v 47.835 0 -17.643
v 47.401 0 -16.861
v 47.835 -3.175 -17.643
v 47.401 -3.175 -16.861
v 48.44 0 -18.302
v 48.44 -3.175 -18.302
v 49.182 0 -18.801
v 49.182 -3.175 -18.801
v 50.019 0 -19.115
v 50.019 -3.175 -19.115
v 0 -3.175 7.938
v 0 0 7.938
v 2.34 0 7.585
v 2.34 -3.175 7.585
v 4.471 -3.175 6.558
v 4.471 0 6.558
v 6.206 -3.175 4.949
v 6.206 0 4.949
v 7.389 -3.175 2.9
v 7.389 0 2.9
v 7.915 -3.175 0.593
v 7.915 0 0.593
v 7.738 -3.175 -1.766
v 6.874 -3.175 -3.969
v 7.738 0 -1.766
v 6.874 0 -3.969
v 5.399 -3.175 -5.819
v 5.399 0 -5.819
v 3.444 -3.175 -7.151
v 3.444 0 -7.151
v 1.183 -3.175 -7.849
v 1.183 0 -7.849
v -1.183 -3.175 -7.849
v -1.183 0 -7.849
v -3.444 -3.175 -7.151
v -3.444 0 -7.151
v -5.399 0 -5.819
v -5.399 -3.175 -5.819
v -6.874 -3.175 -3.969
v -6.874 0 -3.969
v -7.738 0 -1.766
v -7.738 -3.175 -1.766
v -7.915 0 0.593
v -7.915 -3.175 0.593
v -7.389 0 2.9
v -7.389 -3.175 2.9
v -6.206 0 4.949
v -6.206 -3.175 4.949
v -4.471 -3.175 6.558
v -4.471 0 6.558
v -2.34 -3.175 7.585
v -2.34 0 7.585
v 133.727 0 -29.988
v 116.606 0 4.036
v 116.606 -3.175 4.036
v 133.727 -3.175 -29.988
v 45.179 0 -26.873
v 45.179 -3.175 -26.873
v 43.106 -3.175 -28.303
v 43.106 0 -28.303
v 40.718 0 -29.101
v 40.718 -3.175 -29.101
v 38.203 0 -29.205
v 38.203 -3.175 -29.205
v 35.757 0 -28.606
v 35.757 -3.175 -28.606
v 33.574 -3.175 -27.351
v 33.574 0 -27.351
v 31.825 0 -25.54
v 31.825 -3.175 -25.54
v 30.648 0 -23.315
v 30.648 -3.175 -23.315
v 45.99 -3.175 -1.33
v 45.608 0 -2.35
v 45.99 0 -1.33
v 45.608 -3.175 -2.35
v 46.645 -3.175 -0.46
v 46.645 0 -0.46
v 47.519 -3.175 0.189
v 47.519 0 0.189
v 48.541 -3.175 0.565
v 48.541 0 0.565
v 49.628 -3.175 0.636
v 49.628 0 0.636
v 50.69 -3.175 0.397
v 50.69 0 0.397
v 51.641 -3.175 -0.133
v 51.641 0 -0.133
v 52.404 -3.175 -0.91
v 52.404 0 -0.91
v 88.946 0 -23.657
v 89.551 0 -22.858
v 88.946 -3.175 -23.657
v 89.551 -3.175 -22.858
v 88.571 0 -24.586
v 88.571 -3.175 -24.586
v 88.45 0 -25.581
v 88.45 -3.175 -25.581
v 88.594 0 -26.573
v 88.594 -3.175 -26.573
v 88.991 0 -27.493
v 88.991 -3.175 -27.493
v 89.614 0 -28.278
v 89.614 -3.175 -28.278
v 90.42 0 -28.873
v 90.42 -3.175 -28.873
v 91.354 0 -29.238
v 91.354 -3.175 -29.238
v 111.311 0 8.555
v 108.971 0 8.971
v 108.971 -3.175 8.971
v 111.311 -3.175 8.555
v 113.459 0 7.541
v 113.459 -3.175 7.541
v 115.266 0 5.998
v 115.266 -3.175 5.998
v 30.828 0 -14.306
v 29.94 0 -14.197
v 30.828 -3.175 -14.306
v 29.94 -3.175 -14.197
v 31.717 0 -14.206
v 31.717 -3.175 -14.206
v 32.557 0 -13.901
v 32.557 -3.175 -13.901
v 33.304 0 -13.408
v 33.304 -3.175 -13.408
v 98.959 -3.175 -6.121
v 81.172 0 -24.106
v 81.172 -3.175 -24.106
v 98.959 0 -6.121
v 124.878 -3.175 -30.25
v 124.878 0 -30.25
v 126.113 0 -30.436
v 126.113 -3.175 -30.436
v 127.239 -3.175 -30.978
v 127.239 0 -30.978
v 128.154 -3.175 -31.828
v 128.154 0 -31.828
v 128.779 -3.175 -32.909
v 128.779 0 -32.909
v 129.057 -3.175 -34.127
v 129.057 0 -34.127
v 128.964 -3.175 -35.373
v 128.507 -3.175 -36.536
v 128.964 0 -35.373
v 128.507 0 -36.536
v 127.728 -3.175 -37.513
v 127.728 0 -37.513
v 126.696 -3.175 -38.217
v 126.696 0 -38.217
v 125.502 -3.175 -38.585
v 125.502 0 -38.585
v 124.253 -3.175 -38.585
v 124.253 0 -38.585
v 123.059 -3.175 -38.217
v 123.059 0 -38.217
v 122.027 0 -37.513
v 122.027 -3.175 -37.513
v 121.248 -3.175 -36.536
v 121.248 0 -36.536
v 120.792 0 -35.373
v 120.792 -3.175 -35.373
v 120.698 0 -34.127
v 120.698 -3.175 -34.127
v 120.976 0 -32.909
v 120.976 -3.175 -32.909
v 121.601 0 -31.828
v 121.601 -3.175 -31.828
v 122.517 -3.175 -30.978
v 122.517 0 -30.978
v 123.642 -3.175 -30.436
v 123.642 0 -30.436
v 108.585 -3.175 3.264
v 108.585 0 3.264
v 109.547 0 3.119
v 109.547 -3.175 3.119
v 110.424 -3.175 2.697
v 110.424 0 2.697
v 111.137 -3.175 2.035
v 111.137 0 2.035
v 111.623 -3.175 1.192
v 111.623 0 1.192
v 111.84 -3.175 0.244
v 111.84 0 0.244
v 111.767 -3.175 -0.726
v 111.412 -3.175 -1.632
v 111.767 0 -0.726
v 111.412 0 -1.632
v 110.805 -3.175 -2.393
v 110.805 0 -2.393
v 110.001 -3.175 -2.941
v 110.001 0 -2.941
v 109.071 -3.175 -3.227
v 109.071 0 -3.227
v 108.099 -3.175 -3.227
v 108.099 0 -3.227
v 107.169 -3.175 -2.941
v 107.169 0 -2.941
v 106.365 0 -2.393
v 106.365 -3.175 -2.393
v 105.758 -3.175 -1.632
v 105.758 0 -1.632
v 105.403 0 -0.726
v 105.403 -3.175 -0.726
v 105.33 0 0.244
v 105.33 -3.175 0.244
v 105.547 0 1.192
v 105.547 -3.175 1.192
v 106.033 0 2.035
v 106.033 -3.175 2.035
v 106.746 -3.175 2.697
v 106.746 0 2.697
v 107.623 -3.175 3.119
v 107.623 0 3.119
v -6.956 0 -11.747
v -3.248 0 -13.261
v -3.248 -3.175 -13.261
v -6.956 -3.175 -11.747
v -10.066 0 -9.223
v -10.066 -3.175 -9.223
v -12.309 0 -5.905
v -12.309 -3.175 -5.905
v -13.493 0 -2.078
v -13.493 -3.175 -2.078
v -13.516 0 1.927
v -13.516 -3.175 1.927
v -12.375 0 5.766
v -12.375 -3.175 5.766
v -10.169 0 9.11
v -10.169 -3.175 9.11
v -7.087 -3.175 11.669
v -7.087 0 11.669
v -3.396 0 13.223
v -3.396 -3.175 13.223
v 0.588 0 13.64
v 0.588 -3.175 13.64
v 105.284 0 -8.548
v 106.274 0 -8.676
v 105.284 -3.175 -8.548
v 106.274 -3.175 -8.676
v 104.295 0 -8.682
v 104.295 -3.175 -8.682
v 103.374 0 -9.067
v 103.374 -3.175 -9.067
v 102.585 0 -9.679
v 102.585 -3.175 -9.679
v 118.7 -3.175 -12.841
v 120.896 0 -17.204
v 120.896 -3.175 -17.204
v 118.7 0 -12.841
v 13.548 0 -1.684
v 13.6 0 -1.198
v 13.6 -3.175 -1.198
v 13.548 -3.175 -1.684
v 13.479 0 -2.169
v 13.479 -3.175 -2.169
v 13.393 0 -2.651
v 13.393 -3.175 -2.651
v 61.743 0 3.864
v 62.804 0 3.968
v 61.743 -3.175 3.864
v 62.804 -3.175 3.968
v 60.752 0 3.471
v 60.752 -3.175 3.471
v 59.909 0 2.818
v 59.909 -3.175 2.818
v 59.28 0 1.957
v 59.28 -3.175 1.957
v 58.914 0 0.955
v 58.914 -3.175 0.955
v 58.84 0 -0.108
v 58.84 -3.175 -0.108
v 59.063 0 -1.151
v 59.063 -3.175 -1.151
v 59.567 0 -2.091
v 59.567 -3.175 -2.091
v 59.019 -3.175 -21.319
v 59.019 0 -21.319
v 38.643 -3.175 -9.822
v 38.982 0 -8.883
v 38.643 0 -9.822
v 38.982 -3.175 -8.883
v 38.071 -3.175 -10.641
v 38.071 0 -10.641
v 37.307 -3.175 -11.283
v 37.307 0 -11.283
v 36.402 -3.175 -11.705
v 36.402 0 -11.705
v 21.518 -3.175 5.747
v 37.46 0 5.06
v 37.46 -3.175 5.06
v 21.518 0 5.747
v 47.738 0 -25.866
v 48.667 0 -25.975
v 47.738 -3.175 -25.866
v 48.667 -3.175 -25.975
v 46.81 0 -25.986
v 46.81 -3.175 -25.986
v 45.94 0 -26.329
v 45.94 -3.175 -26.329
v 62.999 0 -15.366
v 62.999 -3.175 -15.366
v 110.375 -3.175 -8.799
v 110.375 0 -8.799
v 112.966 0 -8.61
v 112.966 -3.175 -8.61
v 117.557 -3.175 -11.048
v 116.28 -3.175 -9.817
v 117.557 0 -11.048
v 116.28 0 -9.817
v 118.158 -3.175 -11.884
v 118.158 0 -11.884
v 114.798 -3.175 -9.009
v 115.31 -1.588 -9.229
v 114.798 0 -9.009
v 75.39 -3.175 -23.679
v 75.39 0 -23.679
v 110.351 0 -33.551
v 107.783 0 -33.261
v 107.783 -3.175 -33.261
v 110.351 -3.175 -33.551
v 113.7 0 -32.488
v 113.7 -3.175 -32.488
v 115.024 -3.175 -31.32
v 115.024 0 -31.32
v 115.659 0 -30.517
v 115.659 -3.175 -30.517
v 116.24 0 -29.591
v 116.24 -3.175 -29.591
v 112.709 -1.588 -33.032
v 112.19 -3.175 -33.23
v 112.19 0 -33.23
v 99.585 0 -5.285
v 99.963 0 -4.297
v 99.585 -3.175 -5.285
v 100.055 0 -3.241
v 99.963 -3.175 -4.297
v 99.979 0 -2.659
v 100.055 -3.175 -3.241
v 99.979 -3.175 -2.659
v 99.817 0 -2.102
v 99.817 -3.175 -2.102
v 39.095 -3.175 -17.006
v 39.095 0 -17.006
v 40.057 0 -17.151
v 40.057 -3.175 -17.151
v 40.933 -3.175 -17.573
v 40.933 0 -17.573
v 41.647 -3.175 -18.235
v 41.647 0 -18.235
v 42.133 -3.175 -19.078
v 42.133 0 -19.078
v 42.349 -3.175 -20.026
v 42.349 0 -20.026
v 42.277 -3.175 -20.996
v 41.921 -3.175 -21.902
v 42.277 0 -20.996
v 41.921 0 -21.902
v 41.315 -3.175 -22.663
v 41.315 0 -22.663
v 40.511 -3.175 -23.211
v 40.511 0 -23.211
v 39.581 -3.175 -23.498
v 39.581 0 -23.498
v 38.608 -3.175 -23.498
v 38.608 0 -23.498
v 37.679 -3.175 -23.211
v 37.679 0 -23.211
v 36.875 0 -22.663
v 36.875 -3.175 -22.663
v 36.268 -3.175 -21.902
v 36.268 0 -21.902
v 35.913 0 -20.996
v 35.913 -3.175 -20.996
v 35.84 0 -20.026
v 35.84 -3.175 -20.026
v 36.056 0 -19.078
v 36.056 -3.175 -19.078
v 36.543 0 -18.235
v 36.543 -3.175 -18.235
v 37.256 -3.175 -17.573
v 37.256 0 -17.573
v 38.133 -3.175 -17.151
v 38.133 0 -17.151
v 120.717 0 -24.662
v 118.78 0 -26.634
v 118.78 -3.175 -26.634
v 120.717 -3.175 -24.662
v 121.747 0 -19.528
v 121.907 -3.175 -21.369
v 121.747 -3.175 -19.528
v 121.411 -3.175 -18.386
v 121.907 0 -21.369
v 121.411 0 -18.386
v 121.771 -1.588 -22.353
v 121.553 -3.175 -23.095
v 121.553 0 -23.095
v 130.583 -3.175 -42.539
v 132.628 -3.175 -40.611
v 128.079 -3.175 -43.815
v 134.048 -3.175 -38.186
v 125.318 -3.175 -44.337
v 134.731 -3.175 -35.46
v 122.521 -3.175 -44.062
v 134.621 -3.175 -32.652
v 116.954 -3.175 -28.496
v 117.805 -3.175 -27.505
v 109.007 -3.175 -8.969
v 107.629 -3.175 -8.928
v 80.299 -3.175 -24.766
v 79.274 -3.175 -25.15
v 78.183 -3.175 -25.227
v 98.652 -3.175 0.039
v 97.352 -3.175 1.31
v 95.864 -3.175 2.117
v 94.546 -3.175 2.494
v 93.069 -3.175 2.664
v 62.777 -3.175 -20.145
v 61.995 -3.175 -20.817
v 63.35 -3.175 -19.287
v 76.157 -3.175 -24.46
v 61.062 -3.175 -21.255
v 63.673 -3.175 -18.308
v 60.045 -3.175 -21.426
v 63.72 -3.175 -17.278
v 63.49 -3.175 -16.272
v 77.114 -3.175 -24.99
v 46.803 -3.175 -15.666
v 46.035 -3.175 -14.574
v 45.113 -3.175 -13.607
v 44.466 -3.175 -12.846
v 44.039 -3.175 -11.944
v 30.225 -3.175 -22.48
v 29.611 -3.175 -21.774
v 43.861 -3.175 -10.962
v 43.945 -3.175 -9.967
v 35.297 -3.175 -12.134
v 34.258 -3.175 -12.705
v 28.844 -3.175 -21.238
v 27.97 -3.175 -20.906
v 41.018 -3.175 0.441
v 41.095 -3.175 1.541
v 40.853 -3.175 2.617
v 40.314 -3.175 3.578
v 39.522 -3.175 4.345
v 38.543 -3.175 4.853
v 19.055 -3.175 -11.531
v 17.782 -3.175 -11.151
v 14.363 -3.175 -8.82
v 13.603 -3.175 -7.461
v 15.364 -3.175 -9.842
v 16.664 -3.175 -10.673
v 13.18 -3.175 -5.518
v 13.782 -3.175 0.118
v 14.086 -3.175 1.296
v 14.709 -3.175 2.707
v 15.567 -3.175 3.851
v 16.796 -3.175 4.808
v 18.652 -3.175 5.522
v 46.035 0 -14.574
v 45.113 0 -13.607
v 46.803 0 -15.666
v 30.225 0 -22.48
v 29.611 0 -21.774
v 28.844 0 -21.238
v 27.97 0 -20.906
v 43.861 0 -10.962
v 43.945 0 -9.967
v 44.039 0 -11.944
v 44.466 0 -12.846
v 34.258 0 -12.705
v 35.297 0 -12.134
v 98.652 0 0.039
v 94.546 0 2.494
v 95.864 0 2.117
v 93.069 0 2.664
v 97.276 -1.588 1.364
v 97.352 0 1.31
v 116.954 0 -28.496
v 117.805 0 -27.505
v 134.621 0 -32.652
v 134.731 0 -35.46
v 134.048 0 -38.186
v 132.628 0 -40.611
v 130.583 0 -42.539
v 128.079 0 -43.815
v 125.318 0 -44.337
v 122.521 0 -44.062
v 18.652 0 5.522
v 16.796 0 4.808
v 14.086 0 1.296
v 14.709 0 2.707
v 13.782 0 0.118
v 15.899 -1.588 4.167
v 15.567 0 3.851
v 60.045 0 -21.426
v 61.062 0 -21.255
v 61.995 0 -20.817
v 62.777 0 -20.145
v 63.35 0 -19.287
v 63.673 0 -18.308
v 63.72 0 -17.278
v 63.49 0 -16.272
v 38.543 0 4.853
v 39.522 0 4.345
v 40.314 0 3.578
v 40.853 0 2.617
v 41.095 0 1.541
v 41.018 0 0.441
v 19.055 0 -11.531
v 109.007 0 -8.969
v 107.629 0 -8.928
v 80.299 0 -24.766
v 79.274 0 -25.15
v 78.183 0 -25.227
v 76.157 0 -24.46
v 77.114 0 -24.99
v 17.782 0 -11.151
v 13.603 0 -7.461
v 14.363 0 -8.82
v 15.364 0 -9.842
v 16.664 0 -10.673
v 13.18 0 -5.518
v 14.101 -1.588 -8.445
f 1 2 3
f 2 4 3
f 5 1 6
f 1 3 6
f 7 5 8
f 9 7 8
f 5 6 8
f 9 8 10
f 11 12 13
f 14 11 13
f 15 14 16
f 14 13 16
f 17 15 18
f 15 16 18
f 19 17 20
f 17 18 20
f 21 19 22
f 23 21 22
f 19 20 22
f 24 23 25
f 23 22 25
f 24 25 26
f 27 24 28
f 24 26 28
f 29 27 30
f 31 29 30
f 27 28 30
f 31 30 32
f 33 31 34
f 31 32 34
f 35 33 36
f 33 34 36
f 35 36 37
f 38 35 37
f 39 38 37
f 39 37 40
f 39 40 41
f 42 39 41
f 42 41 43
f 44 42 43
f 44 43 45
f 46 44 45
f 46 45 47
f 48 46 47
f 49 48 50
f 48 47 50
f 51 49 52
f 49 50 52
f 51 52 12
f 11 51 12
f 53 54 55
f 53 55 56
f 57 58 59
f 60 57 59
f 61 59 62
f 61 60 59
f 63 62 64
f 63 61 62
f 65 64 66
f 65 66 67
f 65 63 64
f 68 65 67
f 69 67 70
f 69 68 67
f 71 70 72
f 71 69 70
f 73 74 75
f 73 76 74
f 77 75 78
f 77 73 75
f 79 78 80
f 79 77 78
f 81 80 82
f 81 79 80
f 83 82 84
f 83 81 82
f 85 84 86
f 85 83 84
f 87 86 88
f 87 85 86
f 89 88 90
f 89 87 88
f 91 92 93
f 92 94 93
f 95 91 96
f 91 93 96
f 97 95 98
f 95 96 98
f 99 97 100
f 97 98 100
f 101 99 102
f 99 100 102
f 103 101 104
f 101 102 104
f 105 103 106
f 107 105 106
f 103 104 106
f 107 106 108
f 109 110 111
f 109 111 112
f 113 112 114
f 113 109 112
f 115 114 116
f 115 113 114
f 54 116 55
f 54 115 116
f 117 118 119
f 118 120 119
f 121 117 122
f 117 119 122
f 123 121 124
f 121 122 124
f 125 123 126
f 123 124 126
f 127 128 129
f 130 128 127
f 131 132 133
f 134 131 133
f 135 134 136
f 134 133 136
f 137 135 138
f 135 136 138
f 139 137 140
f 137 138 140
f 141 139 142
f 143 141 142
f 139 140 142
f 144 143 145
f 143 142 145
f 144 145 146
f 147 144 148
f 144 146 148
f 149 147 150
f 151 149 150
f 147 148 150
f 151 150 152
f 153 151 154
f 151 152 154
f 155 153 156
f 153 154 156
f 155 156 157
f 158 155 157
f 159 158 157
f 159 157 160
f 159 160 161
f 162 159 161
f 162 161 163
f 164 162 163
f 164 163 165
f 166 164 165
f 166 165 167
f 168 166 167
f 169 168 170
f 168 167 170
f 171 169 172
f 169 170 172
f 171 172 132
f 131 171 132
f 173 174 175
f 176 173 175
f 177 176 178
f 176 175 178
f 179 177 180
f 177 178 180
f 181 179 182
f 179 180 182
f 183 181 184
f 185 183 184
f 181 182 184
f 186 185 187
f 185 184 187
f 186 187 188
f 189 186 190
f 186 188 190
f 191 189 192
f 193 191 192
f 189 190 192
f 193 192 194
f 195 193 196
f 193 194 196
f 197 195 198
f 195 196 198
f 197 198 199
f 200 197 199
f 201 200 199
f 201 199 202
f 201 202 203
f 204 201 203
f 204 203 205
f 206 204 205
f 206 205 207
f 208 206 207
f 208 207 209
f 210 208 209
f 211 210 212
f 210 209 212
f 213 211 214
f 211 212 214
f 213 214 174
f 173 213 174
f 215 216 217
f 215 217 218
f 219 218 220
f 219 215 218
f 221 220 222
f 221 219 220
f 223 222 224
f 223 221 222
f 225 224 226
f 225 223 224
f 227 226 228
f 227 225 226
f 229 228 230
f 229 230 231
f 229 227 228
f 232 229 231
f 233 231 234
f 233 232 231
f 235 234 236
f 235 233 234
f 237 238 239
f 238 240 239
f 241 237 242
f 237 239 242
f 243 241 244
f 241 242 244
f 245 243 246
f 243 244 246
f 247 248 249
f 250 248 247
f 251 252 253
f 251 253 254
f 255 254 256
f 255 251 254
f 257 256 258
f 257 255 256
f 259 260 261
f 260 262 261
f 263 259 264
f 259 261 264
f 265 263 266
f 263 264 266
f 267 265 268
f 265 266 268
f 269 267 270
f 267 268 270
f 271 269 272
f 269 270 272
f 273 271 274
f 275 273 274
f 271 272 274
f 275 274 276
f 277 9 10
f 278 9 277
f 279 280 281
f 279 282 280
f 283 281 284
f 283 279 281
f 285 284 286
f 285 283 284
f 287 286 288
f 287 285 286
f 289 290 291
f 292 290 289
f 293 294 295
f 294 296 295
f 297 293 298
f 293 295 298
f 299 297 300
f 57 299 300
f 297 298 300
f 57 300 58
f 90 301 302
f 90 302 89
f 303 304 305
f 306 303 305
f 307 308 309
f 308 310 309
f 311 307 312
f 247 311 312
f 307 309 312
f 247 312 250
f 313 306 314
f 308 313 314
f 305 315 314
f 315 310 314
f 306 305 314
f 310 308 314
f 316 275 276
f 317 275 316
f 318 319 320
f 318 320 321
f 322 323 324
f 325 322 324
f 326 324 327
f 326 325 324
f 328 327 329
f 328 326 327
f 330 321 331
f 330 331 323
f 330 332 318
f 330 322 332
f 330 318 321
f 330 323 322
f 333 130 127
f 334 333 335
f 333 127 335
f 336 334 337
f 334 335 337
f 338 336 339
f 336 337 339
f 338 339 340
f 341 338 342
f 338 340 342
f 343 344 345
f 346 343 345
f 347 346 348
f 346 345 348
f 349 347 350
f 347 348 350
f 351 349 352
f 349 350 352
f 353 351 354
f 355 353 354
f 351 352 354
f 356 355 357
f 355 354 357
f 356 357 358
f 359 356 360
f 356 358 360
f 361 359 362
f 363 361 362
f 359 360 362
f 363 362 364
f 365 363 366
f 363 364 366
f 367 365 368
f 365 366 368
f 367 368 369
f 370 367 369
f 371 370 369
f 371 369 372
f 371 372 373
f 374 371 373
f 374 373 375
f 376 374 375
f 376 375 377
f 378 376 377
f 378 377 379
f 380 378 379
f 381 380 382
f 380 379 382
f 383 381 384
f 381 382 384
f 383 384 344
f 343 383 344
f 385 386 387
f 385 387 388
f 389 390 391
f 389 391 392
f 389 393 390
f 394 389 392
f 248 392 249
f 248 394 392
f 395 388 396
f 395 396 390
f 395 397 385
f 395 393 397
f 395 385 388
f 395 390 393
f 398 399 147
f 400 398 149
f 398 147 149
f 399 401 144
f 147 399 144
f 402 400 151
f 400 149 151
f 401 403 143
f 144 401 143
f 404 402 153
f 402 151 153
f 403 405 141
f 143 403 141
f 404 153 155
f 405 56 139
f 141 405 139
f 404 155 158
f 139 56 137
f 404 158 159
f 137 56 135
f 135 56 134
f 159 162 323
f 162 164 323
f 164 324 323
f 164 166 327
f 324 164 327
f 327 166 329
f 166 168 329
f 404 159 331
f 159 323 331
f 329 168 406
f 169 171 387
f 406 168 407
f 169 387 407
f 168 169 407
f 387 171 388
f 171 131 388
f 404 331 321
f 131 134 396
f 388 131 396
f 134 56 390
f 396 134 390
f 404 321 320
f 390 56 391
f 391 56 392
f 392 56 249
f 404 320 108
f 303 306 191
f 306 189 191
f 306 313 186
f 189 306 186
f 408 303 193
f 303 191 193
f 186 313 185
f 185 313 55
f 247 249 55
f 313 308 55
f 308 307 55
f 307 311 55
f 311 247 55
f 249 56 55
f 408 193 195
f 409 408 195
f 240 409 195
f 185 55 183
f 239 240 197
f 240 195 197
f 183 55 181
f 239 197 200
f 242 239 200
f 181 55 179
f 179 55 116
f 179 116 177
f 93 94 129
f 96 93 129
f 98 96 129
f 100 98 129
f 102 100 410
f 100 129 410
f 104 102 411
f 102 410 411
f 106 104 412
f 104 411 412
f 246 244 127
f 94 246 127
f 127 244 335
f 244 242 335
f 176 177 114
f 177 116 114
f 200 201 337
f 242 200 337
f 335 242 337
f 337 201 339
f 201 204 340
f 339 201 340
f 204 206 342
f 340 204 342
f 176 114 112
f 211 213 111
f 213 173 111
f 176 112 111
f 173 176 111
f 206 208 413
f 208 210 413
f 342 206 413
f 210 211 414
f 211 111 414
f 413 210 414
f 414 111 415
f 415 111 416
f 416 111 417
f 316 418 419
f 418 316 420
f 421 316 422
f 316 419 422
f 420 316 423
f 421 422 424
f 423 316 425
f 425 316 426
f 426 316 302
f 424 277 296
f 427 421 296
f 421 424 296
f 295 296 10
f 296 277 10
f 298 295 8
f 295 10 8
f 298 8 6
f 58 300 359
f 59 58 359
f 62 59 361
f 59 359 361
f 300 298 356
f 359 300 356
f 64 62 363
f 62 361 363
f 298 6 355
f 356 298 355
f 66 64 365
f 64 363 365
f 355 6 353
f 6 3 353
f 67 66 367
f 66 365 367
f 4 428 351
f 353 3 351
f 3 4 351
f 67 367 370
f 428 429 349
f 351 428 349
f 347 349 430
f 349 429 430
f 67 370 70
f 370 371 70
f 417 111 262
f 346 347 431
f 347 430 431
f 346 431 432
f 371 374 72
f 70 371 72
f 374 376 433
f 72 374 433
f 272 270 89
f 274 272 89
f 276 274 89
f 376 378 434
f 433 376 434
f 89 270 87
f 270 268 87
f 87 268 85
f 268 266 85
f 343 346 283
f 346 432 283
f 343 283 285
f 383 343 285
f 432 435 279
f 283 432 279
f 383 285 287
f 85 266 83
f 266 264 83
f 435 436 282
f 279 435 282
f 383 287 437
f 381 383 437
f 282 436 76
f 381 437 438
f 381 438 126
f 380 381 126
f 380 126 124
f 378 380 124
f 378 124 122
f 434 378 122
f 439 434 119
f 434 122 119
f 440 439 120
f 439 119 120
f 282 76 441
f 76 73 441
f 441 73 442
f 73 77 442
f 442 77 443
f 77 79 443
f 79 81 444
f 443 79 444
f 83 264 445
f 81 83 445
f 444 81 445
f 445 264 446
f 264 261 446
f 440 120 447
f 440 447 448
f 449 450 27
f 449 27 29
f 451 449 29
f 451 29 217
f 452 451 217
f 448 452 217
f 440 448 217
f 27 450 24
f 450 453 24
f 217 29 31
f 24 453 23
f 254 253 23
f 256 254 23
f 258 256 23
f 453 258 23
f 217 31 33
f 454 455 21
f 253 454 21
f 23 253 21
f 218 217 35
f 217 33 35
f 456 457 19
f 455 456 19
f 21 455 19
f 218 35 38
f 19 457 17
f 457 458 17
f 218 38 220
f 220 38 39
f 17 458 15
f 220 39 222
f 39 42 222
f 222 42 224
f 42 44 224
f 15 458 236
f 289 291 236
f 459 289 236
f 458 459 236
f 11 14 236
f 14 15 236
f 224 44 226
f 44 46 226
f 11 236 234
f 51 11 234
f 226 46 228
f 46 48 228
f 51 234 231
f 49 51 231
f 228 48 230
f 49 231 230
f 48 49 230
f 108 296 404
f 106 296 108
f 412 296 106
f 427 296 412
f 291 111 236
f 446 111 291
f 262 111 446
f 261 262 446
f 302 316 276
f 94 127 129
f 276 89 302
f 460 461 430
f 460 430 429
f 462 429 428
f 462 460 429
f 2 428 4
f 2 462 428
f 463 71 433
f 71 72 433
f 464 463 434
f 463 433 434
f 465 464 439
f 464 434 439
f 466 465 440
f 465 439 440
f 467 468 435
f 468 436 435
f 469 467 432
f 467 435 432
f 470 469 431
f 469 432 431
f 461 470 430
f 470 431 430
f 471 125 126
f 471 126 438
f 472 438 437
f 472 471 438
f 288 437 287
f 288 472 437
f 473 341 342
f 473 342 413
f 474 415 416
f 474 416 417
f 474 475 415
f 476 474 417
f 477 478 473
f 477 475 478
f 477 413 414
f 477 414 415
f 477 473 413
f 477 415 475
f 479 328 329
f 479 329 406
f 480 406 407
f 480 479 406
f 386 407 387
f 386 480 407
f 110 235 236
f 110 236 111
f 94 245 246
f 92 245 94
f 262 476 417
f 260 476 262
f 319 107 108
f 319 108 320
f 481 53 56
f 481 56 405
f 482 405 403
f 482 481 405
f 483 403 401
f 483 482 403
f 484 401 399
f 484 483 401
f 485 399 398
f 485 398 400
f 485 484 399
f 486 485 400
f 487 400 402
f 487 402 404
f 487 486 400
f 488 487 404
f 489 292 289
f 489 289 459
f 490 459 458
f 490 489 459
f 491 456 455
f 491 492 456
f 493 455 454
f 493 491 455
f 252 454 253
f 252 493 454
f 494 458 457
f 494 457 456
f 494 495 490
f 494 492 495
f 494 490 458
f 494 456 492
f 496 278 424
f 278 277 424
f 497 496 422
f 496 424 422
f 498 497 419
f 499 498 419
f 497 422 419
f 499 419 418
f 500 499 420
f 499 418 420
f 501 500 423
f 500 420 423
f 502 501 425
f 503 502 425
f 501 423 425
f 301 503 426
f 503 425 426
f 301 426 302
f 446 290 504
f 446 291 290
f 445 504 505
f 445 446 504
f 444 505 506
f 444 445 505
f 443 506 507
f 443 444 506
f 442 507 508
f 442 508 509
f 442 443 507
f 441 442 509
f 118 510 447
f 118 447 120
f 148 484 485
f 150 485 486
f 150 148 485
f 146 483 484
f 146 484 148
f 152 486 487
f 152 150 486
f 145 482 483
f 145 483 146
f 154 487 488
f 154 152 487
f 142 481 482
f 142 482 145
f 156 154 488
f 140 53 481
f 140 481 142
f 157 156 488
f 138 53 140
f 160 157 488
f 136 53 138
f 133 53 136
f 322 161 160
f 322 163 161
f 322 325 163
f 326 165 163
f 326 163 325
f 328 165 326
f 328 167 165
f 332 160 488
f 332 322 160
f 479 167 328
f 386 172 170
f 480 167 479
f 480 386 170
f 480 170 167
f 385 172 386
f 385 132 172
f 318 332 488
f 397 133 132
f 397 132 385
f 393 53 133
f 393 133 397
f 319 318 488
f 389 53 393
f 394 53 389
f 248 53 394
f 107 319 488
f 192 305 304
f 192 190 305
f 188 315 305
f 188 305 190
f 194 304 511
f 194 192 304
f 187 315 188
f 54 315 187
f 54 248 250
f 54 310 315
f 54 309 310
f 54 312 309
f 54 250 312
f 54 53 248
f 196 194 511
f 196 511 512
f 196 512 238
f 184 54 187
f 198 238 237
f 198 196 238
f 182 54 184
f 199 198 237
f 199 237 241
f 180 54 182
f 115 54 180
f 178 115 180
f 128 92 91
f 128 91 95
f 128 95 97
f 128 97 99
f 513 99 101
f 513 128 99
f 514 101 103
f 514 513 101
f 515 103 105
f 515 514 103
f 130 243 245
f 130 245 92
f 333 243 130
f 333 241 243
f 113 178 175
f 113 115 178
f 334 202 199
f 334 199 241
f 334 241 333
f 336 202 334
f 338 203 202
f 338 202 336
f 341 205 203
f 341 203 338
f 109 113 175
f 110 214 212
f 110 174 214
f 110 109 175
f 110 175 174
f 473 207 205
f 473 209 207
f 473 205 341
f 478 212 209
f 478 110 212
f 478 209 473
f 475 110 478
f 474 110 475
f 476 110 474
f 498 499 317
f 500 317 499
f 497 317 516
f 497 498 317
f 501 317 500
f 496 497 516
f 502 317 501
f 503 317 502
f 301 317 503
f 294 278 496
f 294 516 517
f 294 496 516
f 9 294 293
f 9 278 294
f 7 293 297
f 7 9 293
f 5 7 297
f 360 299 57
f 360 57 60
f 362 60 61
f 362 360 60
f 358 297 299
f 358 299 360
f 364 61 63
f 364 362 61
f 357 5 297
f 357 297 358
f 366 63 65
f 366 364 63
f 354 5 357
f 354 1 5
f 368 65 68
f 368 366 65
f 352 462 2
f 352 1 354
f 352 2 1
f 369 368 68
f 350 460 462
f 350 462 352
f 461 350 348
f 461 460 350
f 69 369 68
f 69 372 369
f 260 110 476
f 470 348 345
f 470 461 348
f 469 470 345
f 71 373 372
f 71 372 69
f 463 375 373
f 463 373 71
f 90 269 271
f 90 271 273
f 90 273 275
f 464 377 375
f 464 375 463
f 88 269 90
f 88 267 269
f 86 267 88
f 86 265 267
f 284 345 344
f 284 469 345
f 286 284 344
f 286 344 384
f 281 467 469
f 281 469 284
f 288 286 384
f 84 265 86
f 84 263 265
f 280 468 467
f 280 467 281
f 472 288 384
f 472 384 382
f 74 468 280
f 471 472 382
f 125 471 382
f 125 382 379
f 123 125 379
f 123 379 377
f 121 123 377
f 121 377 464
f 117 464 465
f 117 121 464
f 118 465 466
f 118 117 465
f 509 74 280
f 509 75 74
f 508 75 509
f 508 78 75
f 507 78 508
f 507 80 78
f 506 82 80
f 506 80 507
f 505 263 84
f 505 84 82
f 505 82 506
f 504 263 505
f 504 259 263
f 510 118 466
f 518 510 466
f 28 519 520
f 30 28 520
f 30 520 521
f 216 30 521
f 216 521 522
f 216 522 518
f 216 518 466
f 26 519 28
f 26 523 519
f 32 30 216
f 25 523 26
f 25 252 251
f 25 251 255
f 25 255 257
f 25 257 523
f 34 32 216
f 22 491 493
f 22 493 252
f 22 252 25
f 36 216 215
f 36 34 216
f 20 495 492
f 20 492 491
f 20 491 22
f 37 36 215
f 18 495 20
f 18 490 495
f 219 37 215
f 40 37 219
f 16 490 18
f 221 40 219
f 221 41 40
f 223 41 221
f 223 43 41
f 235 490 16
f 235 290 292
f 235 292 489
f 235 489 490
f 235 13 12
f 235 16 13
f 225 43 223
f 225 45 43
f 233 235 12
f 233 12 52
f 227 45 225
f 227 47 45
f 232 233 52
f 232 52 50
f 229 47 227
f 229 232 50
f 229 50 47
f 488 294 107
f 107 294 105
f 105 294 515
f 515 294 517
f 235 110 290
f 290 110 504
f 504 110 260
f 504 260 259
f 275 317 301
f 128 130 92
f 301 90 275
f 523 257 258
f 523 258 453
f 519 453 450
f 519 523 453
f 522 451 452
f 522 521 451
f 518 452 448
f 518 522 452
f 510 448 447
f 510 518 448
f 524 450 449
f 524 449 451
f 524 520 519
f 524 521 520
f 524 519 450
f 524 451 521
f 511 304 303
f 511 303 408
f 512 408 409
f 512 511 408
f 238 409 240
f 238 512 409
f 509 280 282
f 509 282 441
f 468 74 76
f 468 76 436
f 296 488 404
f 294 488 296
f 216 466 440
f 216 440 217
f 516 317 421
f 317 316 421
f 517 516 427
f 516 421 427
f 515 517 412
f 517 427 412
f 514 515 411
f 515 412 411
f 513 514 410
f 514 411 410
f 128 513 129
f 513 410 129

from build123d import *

# Parameters (mm, degrees)
SKETCH1_R           = 7.9375
SKETCH1_R_2         = 3.2639
SKETCH1_R_3         = 4.191
BOSS_EXTRUDE4_DEPTH = 3.175
FILLET2_R           = 3.81


with BuildPart() as part:
    # Sketch1 → Boss-Extrude4 (new body)
    with BuildSketch(Plane(origin=(0, 0, 0), x_dir=(1, 0, 0), z_dir=(0, 1, 0))):
        with BuildLine():
            ThreePointArc((133.726592386, 29.98785526), (132.627611185, 40.61059676), (122.521356715, 44.06226552))
            Line((122.521356715, 44.06226552), (46.442862481, 25.430137021))
            ThreePointArc((46.442862481, 25.430137021), (36.958837973, 28.991331503), (30.193743977, 21.450619984))
            Line((30.193743977, 21.450619984), (-3.247611444, 13.260609947))
            ThreePointArc((-3.247611444, 13.260609947), (-13.515826194, -1.926966151), (0.587616374, -13.639848359))
            Line((0.587616374, -13.639848359), (108.971460257, -8.970579339))
            ThreePointArc((108.971460257, -8.970579339), (113.459157615, -7.540771363), (116.60566957, -4.036025875))
            Line((116.60566957, -4.036025875), (133.726592386, 29.98785526))
        make_face()
        with Locations(Location((0, 0, 0), (0, 0, 270))):
            Circle(SKETCH1_R, mode=Mode.SUBTRACT)
        with BuildLine():
            Line((41.984168993, -4.864970405), (12.189591197, -6.148546389))
            ThreePointArc((12.189591197, -6.148546389), (13.515826194, 1.926966151), (9.985636063, 9.310092839))
            Line((9.985636063, 9.310092839), (32.042893317, 14.712061629))
            ThreePointArc((32.042893317, 14.712061629), (34.888474765, 12.337435423), (38.450716367, 11.314391845))
            Line((38.450716367, 11.314391845), (41.984168993, -4.864970405))
        make_face(mode=Mode.SUBTRACT)
        with BuildLine():
            Line((69.18664036, 23.808811963), (47.410466333, -5.902378846))
            Line((47.410466333, -5.902378846), (43.413738486, 12.398279038))
            ThreePointArc((43.413738486, 12.398279038), (46.36017499, 14.994407118), (47.916850432, 18.599699151))
            Line((47.916850432, 18.599699151), (69.18664036, 23.808811963))
        make_face(mode=Mode.SUBTRACT)
        with Locations(Location((108.585, 0, 0), (0, 0, 270))):
            Circle(SKETCH1_R_2, mode=Mode.SUBTRACT)
        with Locations(Location((39.094708942, 20.270167566, 0), (0, 0, 270))):
            Circle(SKETCH1_R_2, mode=Mode.SUBTRACT)
        with BuildLine():
            Line((99.924218758, -2.368863331), (54.876229285, -4.309569382))
            Line((54.876229285, -4.309569382), (78.030840873, 27.282347644))
            Line((78.030840873, 27.282347644), (100.723144875, 4.337266328))
            ThreePointArc((100.723144875, 4.337266328), (99.66914772, 1.062178575), (99.924218758, -2.368863331))
        make_face(mode=Mode.SUBTRACT)
        with BuildLine():
            Line((84.823475635, 27.638376771), (114.98908268, 35.026134276))
            ThreePointArc((114.98908268, 35.026134276), (117.570132445, 27.752761279), (124.58688197, 24.538885311))
            Line((124.58688197, 24.538885311), (115.260501822, 6.004858086))
            ThreePointArc((115.260501822, 6.004858086), (110.126982004, 8.845503757), (104.335087932, 7.90941797))
            Line((104.335087932, 7.90941797), (84.823475635, 27.638376771))
        make_face(mode=Mode.SUBTRACT)
        with Locations(Location((124.877763158, 34.440613651, 0), (0, 0, 270))):
            Circle(SKETCH1_R_3, mode=Mode.SUBTRACT)
    extrude(amount=-BOSS_EXTRUDE4_DEPTH)

    # Fillet1
    # a fillet whose section is not a circle: 7.62 mm, written as the material it adds along each edge
    with BuildSketch(Plane(origin=(115.260501822, 0, -6.004858086), x_dir=(-0.8680919950979666, 0, -0.4964033521712276), z_dir=(0, -1, 0))) as fillet1_piece_1:
        with BuildLine():
            Bezier((5.628236023, 0), (0.097286133, 1.825453133), (0.407253439, 7.641603586), weights=[1, 1, 1])
            Line((0.407253439, 7.641603586), (0, 0))
            ThreePointArc((0, 0), (2.814118011, 0.452389282), (5.628236023, 0))
        make_face()
    extrude(amount=3.175)
    with BuildSketch(Plane(origin=(124.58688197, 0, -24.538885311), x_dir=(-0.9406523774093201, 0, -0.3393716323946274), z_dir=(0, -1, 0))) as fillet1_piece_2:
        with BuildLine():
            Bezier((6.173495259, 0), (0.234745196, -1.947499202), (0.982676409, -8.152505596), weights=[1, 1, 1])
            Line((0.982676409, -8.152505596), (0, 0))
            ThreePointArc((0, 0), (3.08674763, -0.493198872), (6.173495259, 0))
        make_face()
    extrude(amount=3.175)
    with BuildSketch(Plane(origin=(114.98908268, 0, -35.026134276), x_dir=(-0.9712953632492297, 0, 0.23787668513443497), z_dir=(0, -1, 0))) as fillet1_piece_3:
        with BuildLine():
            Bezier((7.418766675, 0), (1.629858857, 0), (0.077760385, -5.576956522), weights=[1, 1, 1])
            ThreePointArc((0.077760385, -5.576956522), (0.439489428, -2.782892503), (0, 0))
            Line((0, 0), (7.418766675, 0))
        make_face()
    extrude(amount=3.175)
    with BuildSketch(Plane(origin=(9.985636063, 0, -9.310092839), x_dir=(0.4554657293432797, 0, 0.8902533175415829), z_dir=(0, -1, 0))) as fillet1_piece_4:
        with BuildLine():
            Bezier((7.480452048, 0), (0.473095274, -1.996096811), (2.153427849, -9.085803001), weights=[1, 1, 1])
            Line((2.153427849, -9.085803001), (0, 0))
            ThreePointArc((0, 0), (3.740226024, -0.522326142), (7.480452048, 0))
        make_face()
    extrude(amount=3.175)
    with BuildSketch(Plane(origin=(99.924218758, 0, 2.368863331), x_dir=(0.01787605144618897, 0, -0.9998402106260246), z_dir=(0, -1, 0))) as fillet1_piece_5:
        with BuildLine():
            Bezier((5.046610766, 0), (-0.091794663, -1.504663887), (-0.417829547, -6.848906118), weights=[1, 1, 1])
            Line((-0.417829547, -6.848906118), (0, 0))
            ThreePointArc((0, 0), (2.523305383, -0.361848581), (5.046610766, 0))
        make_face()
    extrude(amount=3.175)
    with BuildSketch(Plane(origin=(12.189591197, 0, 6.148546389), x_dir=(0.9990733095506228, 0, -0.043040935672514394), z_dir=(0, -1, 0))) as fillet1_piece_6:
        with BuildLine():
            Bezier((9.337508644, 0), (2.051395042, 0), (1.725151149, -7.27880597), weights=[1, 1, 1])
            ThreePointArc((1.725151149, -7.27880597), (1.370821683, -3.518943481), (0, 0))
            Line((0, 0), (9.337508644, 0))
        make_face()
    extrude(amount=3.175)

    # Fillet2
    fillet2_edges = [part.edges().sort_by_distance(p)[0] for p in [
        (104.335087932, -1.5875, -7.90941797),
        (100.723144875, -1.5875, -4.337266328),
        (84.823475635, -1.5875, -27.638376771),
        (69.18664036, -1.5875, -23.808811963),
        (41.984168993, -1.5875, 4.864970405),
        (32.042893317, -1.5875, -14.712061629),
        (47.916850432, -1.5875, -18.599699151),
        (38.450716367, -1.5875, -11.314391845),
        (43.413738486, -1.5875, -12.398279038),
        (54.876229285, -1.5875, 4.309569382),
        (47.410466333, -1.5875, 5.902378846),
        (78.030840873, -1.5875, -27.282347644),
        (30.193743977, -1.5875, -21.450619984),
        (46.442862481, -1.5875, -25.430137021),
    ]]
    fillet(fillet2_edges, radius=FILLET2_R)


solid = part.part
